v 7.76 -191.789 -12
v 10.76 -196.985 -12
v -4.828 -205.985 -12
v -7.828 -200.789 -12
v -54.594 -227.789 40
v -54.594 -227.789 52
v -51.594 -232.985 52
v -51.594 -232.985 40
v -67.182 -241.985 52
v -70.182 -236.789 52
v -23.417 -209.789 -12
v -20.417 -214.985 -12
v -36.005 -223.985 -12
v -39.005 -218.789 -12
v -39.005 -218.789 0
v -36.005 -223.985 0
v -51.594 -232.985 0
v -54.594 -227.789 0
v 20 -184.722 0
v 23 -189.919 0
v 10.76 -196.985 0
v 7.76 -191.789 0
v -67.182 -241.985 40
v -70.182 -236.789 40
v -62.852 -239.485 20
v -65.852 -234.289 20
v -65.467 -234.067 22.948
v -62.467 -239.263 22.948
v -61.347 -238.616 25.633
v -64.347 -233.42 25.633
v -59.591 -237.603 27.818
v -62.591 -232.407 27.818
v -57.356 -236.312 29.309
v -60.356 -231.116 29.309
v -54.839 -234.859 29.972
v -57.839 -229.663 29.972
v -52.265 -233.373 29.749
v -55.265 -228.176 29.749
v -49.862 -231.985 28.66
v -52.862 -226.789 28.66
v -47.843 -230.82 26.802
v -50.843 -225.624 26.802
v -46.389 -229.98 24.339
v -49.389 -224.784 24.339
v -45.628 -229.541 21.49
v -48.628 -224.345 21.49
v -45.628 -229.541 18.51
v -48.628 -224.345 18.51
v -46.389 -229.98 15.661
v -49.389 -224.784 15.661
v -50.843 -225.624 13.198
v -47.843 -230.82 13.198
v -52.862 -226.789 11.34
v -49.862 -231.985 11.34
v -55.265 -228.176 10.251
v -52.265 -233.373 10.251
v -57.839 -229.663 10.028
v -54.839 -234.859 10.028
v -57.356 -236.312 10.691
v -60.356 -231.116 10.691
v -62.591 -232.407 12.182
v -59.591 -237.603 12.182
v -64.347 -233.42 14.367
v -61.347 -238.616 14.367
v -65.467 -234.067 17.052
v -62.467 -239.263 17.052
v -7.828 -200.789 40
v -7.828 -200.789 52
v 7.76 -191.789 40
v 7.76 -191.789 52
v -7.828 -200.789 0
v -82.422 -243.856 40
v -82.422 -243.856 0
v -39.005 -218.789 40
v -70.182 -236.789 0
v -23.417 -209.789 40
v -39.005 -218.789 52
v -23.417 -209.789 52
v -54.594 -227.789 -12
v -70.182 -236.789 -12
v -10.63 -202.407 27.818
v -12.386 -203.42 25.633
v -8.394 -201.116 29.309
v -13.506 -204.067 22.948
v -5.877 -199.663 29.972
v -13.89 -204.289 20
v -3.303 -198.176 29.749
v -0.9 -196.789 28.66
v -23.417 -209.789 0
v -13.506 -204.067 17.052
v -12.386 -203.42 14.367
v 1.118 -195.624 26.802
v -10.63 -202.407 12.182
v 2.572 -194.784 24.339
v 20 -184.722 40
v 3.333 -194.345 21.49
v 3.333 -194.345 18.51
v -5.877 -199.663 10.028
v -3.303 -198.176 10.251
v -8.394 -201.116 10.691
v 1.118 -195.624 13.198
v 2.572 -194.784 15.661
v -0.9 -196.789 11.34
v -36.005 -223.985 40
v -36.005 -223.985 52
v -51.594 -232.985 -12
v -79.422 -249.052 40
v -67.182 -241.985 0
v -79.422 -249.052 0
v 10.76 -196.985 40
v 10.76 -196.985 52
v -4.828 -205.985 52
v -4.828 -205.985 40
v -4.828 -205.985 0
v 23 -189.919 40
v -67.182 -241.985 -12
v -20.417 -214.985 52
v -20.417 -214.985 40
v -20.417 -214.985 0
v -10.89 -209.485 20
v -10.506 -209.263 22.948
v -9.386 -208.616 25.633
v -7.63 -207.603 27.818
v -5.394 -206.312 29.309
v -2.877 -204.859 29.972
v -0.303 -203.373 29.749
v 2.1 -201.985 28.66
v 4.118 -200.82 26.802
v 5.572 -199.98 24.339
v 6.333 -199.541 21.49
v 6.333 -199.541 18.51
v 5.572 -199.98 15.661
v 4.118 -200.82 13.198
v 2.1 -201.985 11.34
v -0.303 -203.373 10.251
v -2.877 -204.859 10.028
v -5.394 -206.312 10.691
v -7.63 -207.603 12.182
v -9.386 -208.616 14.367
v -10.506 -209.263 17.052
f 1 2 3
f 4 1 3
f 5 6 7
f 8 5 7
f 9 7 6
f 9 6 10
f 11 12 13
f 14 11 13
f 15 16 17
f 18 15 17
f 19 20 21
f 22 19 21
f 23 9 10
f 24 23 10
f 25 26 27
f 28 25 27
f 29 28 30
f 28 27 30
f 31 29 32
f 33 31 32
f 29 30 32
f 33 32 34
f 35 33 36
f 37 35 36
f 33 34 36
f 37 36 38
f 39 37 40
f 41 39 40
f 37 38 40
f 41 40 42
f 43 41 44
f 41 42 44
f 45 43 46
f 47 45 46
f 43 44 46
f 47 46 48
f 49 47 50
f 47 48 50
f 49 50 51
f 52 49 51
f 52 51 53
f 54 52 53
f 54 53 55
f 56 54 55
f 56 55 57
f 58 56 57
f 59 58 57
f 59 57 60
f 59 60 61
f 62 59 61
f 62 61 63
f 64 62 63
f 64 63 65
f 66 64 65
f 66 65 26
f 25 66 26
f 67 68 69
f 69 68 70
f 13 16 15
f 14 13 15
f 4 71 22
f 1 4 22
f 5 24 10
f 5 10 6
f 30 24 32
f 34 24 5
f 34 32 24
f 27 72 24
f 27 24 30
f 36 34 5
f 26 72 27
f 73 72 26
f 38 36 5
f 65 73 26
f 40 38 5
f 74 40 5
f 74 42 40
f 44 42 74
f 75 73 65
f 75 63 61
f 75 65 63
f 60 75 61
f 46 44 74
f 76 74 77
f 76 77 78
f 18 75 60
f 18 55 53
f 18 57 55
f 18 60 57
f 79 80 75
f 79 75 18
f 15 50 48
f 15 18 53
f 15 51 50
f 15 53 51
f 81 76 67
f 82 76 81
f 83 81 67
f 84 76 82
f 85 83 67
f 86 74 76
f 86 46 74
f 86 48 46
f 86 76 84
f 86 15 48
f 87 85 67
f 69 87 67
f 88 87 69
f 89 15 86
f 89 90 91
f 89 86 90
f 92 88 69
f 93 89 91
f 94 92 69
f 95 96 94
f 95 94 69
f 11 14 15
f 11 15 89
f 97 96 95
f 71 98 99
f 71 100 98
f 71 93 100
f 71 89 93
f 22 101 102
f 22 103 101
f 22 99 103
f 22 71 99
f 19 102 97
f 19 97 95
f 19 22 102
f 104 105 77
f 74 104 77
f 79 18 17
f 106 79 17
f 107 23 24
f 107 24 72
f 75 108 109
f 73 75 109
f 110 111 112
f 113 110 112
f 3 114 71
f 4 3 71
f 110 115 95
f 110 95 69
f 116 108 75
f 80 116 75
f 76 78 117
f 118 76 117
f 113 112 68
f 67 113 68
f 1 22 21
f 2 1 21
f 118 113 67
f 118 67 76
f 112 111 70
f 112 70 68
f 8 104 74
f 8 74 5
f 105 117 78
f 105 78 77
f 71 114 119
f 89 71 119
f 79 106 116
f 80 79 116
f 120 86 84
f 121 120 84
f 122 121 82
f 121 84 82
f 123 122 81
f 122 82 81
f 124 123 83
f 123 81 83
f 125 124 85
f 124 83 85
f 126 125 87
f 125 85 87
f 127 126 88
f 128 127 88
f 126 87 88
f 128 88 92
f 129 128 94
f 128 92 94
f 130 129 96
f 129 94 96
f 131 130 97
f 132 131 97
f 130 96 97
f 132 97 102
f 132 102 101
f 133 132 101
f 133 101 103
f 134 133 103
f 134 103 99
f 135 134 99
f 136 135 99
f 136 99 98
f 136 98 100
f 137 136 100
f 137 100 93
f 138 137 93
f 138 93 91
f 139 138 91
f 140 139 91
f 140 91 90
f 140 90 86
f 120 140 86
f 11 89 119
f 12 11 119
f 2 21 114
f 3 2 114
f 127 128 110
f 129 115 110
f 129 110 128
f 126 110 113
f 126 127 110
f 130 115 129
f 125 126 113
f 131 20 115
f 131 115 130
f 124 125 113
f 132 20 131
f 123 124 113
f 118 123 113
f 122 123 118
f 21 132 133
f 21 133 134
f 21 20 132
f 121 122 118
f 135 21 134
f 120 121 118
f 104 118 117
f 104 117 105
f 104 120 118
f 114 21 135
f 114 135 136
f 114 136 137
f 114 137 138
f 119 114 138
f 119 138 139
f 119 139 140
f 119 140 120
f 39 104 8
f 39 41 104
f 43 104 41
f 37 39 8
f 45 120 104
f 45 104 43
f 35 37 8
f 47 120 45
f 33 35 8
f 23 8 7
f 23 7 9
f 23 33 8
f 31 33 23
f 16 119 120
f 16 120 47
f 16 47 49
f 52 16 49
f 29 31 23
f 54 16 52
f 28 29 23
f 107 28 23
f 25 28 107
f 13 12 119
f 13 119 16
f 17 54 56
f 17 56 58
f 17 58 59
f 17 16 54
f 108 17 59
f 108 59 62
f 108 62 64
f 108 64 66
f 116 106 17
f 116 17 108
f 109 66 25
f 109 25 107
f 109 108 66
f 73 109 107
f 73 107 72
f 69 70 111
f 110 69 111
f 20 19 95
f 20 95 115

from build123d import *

# Parameters (mm, degrees)
BOSS_EXTRU_1_DEPTH      = 40
BOSS_EXTRU_2_DEPTH      = 12
BOSS_EXTRU_2_DEPTH_BACK = 52
ESQUISSE2_R             = 10
ENL_V_MAT_EXTRU_2_DEPTH = 12


with BuildPart() as part:
    # Esquisse1 → Boss.-Extru.1 (new body)
    with BuildSketch(Plane.XY):
        Polygon((-82.421937441, -243.855765017), (20, -184.722431864), (23, -189.918584287), (-79.421937441, -249.05191744), align=None)
    extrude(amount=BOSS_EXTRU_1_DEPTH)

    # Esquisse3 → Boss.-Extru.2 (add, two sides: drawn at the far end of the back side and taken through both)
    with BuildSketch(Plane(origin=(0, 0, 0), x_dir=(-1, 0, 0), z_dir=(0, 0, -1)).offset(-BOSS_EXTRU_2_DEPTH_BACK)):
        Polygon((4.828282819, -205.985250863), (7.828282819, -200.789098441), (-7.76017445, -191.789098441), (-10.76017445, -196.985250863), align=None)
        Polygon((39.005197355, -218.789098441), (31.210968721, -214.289098441), (28.210968721, -219.485250863), (36.005197355, -223.985250863), align=None)
        Polygon((28.210968721, -219.485250863), (31.210968721, -214.289098441), (23.416740087, -209.789098441), (20.416740087, -214.985250863), align=None)
        Polygon((70.182111891, -236.789098441), (54.593654623, -227.789098441), (51.593654623, -232.985250863), (67.182111891, -241.985250863), align=None)
    extrude(amount=BOSS_EXTRU_2_DEPTH + BOSS_EXTRU_2_DEPTH_BACK)

    # Esquisse2 → Enlèv. mat.-Extru.2 (cut)
    with BuildSketch(Plane(origin=(84.987159322, -147.202077936, 0), x_dir=(0.8660254037844385, 0.5000000000000003, 0), z_dir=(-0.5000000000000003, 0.8660254037844385, 0))):
        with Locations(Location((-164.174041009, -20, 0), (0, 0, 180))):
            Circle(ESQUISSE2_R)
        with Locations(Location((-104.174041009, -20, 0), (0, 0, 180))):
            Circle(ESQUISSE2_R)
    extrude(amount=-ENL_V_MAT_EXTRU_2_DEPTH, mode=Mode.SUBTRACT)


solid = part.part
